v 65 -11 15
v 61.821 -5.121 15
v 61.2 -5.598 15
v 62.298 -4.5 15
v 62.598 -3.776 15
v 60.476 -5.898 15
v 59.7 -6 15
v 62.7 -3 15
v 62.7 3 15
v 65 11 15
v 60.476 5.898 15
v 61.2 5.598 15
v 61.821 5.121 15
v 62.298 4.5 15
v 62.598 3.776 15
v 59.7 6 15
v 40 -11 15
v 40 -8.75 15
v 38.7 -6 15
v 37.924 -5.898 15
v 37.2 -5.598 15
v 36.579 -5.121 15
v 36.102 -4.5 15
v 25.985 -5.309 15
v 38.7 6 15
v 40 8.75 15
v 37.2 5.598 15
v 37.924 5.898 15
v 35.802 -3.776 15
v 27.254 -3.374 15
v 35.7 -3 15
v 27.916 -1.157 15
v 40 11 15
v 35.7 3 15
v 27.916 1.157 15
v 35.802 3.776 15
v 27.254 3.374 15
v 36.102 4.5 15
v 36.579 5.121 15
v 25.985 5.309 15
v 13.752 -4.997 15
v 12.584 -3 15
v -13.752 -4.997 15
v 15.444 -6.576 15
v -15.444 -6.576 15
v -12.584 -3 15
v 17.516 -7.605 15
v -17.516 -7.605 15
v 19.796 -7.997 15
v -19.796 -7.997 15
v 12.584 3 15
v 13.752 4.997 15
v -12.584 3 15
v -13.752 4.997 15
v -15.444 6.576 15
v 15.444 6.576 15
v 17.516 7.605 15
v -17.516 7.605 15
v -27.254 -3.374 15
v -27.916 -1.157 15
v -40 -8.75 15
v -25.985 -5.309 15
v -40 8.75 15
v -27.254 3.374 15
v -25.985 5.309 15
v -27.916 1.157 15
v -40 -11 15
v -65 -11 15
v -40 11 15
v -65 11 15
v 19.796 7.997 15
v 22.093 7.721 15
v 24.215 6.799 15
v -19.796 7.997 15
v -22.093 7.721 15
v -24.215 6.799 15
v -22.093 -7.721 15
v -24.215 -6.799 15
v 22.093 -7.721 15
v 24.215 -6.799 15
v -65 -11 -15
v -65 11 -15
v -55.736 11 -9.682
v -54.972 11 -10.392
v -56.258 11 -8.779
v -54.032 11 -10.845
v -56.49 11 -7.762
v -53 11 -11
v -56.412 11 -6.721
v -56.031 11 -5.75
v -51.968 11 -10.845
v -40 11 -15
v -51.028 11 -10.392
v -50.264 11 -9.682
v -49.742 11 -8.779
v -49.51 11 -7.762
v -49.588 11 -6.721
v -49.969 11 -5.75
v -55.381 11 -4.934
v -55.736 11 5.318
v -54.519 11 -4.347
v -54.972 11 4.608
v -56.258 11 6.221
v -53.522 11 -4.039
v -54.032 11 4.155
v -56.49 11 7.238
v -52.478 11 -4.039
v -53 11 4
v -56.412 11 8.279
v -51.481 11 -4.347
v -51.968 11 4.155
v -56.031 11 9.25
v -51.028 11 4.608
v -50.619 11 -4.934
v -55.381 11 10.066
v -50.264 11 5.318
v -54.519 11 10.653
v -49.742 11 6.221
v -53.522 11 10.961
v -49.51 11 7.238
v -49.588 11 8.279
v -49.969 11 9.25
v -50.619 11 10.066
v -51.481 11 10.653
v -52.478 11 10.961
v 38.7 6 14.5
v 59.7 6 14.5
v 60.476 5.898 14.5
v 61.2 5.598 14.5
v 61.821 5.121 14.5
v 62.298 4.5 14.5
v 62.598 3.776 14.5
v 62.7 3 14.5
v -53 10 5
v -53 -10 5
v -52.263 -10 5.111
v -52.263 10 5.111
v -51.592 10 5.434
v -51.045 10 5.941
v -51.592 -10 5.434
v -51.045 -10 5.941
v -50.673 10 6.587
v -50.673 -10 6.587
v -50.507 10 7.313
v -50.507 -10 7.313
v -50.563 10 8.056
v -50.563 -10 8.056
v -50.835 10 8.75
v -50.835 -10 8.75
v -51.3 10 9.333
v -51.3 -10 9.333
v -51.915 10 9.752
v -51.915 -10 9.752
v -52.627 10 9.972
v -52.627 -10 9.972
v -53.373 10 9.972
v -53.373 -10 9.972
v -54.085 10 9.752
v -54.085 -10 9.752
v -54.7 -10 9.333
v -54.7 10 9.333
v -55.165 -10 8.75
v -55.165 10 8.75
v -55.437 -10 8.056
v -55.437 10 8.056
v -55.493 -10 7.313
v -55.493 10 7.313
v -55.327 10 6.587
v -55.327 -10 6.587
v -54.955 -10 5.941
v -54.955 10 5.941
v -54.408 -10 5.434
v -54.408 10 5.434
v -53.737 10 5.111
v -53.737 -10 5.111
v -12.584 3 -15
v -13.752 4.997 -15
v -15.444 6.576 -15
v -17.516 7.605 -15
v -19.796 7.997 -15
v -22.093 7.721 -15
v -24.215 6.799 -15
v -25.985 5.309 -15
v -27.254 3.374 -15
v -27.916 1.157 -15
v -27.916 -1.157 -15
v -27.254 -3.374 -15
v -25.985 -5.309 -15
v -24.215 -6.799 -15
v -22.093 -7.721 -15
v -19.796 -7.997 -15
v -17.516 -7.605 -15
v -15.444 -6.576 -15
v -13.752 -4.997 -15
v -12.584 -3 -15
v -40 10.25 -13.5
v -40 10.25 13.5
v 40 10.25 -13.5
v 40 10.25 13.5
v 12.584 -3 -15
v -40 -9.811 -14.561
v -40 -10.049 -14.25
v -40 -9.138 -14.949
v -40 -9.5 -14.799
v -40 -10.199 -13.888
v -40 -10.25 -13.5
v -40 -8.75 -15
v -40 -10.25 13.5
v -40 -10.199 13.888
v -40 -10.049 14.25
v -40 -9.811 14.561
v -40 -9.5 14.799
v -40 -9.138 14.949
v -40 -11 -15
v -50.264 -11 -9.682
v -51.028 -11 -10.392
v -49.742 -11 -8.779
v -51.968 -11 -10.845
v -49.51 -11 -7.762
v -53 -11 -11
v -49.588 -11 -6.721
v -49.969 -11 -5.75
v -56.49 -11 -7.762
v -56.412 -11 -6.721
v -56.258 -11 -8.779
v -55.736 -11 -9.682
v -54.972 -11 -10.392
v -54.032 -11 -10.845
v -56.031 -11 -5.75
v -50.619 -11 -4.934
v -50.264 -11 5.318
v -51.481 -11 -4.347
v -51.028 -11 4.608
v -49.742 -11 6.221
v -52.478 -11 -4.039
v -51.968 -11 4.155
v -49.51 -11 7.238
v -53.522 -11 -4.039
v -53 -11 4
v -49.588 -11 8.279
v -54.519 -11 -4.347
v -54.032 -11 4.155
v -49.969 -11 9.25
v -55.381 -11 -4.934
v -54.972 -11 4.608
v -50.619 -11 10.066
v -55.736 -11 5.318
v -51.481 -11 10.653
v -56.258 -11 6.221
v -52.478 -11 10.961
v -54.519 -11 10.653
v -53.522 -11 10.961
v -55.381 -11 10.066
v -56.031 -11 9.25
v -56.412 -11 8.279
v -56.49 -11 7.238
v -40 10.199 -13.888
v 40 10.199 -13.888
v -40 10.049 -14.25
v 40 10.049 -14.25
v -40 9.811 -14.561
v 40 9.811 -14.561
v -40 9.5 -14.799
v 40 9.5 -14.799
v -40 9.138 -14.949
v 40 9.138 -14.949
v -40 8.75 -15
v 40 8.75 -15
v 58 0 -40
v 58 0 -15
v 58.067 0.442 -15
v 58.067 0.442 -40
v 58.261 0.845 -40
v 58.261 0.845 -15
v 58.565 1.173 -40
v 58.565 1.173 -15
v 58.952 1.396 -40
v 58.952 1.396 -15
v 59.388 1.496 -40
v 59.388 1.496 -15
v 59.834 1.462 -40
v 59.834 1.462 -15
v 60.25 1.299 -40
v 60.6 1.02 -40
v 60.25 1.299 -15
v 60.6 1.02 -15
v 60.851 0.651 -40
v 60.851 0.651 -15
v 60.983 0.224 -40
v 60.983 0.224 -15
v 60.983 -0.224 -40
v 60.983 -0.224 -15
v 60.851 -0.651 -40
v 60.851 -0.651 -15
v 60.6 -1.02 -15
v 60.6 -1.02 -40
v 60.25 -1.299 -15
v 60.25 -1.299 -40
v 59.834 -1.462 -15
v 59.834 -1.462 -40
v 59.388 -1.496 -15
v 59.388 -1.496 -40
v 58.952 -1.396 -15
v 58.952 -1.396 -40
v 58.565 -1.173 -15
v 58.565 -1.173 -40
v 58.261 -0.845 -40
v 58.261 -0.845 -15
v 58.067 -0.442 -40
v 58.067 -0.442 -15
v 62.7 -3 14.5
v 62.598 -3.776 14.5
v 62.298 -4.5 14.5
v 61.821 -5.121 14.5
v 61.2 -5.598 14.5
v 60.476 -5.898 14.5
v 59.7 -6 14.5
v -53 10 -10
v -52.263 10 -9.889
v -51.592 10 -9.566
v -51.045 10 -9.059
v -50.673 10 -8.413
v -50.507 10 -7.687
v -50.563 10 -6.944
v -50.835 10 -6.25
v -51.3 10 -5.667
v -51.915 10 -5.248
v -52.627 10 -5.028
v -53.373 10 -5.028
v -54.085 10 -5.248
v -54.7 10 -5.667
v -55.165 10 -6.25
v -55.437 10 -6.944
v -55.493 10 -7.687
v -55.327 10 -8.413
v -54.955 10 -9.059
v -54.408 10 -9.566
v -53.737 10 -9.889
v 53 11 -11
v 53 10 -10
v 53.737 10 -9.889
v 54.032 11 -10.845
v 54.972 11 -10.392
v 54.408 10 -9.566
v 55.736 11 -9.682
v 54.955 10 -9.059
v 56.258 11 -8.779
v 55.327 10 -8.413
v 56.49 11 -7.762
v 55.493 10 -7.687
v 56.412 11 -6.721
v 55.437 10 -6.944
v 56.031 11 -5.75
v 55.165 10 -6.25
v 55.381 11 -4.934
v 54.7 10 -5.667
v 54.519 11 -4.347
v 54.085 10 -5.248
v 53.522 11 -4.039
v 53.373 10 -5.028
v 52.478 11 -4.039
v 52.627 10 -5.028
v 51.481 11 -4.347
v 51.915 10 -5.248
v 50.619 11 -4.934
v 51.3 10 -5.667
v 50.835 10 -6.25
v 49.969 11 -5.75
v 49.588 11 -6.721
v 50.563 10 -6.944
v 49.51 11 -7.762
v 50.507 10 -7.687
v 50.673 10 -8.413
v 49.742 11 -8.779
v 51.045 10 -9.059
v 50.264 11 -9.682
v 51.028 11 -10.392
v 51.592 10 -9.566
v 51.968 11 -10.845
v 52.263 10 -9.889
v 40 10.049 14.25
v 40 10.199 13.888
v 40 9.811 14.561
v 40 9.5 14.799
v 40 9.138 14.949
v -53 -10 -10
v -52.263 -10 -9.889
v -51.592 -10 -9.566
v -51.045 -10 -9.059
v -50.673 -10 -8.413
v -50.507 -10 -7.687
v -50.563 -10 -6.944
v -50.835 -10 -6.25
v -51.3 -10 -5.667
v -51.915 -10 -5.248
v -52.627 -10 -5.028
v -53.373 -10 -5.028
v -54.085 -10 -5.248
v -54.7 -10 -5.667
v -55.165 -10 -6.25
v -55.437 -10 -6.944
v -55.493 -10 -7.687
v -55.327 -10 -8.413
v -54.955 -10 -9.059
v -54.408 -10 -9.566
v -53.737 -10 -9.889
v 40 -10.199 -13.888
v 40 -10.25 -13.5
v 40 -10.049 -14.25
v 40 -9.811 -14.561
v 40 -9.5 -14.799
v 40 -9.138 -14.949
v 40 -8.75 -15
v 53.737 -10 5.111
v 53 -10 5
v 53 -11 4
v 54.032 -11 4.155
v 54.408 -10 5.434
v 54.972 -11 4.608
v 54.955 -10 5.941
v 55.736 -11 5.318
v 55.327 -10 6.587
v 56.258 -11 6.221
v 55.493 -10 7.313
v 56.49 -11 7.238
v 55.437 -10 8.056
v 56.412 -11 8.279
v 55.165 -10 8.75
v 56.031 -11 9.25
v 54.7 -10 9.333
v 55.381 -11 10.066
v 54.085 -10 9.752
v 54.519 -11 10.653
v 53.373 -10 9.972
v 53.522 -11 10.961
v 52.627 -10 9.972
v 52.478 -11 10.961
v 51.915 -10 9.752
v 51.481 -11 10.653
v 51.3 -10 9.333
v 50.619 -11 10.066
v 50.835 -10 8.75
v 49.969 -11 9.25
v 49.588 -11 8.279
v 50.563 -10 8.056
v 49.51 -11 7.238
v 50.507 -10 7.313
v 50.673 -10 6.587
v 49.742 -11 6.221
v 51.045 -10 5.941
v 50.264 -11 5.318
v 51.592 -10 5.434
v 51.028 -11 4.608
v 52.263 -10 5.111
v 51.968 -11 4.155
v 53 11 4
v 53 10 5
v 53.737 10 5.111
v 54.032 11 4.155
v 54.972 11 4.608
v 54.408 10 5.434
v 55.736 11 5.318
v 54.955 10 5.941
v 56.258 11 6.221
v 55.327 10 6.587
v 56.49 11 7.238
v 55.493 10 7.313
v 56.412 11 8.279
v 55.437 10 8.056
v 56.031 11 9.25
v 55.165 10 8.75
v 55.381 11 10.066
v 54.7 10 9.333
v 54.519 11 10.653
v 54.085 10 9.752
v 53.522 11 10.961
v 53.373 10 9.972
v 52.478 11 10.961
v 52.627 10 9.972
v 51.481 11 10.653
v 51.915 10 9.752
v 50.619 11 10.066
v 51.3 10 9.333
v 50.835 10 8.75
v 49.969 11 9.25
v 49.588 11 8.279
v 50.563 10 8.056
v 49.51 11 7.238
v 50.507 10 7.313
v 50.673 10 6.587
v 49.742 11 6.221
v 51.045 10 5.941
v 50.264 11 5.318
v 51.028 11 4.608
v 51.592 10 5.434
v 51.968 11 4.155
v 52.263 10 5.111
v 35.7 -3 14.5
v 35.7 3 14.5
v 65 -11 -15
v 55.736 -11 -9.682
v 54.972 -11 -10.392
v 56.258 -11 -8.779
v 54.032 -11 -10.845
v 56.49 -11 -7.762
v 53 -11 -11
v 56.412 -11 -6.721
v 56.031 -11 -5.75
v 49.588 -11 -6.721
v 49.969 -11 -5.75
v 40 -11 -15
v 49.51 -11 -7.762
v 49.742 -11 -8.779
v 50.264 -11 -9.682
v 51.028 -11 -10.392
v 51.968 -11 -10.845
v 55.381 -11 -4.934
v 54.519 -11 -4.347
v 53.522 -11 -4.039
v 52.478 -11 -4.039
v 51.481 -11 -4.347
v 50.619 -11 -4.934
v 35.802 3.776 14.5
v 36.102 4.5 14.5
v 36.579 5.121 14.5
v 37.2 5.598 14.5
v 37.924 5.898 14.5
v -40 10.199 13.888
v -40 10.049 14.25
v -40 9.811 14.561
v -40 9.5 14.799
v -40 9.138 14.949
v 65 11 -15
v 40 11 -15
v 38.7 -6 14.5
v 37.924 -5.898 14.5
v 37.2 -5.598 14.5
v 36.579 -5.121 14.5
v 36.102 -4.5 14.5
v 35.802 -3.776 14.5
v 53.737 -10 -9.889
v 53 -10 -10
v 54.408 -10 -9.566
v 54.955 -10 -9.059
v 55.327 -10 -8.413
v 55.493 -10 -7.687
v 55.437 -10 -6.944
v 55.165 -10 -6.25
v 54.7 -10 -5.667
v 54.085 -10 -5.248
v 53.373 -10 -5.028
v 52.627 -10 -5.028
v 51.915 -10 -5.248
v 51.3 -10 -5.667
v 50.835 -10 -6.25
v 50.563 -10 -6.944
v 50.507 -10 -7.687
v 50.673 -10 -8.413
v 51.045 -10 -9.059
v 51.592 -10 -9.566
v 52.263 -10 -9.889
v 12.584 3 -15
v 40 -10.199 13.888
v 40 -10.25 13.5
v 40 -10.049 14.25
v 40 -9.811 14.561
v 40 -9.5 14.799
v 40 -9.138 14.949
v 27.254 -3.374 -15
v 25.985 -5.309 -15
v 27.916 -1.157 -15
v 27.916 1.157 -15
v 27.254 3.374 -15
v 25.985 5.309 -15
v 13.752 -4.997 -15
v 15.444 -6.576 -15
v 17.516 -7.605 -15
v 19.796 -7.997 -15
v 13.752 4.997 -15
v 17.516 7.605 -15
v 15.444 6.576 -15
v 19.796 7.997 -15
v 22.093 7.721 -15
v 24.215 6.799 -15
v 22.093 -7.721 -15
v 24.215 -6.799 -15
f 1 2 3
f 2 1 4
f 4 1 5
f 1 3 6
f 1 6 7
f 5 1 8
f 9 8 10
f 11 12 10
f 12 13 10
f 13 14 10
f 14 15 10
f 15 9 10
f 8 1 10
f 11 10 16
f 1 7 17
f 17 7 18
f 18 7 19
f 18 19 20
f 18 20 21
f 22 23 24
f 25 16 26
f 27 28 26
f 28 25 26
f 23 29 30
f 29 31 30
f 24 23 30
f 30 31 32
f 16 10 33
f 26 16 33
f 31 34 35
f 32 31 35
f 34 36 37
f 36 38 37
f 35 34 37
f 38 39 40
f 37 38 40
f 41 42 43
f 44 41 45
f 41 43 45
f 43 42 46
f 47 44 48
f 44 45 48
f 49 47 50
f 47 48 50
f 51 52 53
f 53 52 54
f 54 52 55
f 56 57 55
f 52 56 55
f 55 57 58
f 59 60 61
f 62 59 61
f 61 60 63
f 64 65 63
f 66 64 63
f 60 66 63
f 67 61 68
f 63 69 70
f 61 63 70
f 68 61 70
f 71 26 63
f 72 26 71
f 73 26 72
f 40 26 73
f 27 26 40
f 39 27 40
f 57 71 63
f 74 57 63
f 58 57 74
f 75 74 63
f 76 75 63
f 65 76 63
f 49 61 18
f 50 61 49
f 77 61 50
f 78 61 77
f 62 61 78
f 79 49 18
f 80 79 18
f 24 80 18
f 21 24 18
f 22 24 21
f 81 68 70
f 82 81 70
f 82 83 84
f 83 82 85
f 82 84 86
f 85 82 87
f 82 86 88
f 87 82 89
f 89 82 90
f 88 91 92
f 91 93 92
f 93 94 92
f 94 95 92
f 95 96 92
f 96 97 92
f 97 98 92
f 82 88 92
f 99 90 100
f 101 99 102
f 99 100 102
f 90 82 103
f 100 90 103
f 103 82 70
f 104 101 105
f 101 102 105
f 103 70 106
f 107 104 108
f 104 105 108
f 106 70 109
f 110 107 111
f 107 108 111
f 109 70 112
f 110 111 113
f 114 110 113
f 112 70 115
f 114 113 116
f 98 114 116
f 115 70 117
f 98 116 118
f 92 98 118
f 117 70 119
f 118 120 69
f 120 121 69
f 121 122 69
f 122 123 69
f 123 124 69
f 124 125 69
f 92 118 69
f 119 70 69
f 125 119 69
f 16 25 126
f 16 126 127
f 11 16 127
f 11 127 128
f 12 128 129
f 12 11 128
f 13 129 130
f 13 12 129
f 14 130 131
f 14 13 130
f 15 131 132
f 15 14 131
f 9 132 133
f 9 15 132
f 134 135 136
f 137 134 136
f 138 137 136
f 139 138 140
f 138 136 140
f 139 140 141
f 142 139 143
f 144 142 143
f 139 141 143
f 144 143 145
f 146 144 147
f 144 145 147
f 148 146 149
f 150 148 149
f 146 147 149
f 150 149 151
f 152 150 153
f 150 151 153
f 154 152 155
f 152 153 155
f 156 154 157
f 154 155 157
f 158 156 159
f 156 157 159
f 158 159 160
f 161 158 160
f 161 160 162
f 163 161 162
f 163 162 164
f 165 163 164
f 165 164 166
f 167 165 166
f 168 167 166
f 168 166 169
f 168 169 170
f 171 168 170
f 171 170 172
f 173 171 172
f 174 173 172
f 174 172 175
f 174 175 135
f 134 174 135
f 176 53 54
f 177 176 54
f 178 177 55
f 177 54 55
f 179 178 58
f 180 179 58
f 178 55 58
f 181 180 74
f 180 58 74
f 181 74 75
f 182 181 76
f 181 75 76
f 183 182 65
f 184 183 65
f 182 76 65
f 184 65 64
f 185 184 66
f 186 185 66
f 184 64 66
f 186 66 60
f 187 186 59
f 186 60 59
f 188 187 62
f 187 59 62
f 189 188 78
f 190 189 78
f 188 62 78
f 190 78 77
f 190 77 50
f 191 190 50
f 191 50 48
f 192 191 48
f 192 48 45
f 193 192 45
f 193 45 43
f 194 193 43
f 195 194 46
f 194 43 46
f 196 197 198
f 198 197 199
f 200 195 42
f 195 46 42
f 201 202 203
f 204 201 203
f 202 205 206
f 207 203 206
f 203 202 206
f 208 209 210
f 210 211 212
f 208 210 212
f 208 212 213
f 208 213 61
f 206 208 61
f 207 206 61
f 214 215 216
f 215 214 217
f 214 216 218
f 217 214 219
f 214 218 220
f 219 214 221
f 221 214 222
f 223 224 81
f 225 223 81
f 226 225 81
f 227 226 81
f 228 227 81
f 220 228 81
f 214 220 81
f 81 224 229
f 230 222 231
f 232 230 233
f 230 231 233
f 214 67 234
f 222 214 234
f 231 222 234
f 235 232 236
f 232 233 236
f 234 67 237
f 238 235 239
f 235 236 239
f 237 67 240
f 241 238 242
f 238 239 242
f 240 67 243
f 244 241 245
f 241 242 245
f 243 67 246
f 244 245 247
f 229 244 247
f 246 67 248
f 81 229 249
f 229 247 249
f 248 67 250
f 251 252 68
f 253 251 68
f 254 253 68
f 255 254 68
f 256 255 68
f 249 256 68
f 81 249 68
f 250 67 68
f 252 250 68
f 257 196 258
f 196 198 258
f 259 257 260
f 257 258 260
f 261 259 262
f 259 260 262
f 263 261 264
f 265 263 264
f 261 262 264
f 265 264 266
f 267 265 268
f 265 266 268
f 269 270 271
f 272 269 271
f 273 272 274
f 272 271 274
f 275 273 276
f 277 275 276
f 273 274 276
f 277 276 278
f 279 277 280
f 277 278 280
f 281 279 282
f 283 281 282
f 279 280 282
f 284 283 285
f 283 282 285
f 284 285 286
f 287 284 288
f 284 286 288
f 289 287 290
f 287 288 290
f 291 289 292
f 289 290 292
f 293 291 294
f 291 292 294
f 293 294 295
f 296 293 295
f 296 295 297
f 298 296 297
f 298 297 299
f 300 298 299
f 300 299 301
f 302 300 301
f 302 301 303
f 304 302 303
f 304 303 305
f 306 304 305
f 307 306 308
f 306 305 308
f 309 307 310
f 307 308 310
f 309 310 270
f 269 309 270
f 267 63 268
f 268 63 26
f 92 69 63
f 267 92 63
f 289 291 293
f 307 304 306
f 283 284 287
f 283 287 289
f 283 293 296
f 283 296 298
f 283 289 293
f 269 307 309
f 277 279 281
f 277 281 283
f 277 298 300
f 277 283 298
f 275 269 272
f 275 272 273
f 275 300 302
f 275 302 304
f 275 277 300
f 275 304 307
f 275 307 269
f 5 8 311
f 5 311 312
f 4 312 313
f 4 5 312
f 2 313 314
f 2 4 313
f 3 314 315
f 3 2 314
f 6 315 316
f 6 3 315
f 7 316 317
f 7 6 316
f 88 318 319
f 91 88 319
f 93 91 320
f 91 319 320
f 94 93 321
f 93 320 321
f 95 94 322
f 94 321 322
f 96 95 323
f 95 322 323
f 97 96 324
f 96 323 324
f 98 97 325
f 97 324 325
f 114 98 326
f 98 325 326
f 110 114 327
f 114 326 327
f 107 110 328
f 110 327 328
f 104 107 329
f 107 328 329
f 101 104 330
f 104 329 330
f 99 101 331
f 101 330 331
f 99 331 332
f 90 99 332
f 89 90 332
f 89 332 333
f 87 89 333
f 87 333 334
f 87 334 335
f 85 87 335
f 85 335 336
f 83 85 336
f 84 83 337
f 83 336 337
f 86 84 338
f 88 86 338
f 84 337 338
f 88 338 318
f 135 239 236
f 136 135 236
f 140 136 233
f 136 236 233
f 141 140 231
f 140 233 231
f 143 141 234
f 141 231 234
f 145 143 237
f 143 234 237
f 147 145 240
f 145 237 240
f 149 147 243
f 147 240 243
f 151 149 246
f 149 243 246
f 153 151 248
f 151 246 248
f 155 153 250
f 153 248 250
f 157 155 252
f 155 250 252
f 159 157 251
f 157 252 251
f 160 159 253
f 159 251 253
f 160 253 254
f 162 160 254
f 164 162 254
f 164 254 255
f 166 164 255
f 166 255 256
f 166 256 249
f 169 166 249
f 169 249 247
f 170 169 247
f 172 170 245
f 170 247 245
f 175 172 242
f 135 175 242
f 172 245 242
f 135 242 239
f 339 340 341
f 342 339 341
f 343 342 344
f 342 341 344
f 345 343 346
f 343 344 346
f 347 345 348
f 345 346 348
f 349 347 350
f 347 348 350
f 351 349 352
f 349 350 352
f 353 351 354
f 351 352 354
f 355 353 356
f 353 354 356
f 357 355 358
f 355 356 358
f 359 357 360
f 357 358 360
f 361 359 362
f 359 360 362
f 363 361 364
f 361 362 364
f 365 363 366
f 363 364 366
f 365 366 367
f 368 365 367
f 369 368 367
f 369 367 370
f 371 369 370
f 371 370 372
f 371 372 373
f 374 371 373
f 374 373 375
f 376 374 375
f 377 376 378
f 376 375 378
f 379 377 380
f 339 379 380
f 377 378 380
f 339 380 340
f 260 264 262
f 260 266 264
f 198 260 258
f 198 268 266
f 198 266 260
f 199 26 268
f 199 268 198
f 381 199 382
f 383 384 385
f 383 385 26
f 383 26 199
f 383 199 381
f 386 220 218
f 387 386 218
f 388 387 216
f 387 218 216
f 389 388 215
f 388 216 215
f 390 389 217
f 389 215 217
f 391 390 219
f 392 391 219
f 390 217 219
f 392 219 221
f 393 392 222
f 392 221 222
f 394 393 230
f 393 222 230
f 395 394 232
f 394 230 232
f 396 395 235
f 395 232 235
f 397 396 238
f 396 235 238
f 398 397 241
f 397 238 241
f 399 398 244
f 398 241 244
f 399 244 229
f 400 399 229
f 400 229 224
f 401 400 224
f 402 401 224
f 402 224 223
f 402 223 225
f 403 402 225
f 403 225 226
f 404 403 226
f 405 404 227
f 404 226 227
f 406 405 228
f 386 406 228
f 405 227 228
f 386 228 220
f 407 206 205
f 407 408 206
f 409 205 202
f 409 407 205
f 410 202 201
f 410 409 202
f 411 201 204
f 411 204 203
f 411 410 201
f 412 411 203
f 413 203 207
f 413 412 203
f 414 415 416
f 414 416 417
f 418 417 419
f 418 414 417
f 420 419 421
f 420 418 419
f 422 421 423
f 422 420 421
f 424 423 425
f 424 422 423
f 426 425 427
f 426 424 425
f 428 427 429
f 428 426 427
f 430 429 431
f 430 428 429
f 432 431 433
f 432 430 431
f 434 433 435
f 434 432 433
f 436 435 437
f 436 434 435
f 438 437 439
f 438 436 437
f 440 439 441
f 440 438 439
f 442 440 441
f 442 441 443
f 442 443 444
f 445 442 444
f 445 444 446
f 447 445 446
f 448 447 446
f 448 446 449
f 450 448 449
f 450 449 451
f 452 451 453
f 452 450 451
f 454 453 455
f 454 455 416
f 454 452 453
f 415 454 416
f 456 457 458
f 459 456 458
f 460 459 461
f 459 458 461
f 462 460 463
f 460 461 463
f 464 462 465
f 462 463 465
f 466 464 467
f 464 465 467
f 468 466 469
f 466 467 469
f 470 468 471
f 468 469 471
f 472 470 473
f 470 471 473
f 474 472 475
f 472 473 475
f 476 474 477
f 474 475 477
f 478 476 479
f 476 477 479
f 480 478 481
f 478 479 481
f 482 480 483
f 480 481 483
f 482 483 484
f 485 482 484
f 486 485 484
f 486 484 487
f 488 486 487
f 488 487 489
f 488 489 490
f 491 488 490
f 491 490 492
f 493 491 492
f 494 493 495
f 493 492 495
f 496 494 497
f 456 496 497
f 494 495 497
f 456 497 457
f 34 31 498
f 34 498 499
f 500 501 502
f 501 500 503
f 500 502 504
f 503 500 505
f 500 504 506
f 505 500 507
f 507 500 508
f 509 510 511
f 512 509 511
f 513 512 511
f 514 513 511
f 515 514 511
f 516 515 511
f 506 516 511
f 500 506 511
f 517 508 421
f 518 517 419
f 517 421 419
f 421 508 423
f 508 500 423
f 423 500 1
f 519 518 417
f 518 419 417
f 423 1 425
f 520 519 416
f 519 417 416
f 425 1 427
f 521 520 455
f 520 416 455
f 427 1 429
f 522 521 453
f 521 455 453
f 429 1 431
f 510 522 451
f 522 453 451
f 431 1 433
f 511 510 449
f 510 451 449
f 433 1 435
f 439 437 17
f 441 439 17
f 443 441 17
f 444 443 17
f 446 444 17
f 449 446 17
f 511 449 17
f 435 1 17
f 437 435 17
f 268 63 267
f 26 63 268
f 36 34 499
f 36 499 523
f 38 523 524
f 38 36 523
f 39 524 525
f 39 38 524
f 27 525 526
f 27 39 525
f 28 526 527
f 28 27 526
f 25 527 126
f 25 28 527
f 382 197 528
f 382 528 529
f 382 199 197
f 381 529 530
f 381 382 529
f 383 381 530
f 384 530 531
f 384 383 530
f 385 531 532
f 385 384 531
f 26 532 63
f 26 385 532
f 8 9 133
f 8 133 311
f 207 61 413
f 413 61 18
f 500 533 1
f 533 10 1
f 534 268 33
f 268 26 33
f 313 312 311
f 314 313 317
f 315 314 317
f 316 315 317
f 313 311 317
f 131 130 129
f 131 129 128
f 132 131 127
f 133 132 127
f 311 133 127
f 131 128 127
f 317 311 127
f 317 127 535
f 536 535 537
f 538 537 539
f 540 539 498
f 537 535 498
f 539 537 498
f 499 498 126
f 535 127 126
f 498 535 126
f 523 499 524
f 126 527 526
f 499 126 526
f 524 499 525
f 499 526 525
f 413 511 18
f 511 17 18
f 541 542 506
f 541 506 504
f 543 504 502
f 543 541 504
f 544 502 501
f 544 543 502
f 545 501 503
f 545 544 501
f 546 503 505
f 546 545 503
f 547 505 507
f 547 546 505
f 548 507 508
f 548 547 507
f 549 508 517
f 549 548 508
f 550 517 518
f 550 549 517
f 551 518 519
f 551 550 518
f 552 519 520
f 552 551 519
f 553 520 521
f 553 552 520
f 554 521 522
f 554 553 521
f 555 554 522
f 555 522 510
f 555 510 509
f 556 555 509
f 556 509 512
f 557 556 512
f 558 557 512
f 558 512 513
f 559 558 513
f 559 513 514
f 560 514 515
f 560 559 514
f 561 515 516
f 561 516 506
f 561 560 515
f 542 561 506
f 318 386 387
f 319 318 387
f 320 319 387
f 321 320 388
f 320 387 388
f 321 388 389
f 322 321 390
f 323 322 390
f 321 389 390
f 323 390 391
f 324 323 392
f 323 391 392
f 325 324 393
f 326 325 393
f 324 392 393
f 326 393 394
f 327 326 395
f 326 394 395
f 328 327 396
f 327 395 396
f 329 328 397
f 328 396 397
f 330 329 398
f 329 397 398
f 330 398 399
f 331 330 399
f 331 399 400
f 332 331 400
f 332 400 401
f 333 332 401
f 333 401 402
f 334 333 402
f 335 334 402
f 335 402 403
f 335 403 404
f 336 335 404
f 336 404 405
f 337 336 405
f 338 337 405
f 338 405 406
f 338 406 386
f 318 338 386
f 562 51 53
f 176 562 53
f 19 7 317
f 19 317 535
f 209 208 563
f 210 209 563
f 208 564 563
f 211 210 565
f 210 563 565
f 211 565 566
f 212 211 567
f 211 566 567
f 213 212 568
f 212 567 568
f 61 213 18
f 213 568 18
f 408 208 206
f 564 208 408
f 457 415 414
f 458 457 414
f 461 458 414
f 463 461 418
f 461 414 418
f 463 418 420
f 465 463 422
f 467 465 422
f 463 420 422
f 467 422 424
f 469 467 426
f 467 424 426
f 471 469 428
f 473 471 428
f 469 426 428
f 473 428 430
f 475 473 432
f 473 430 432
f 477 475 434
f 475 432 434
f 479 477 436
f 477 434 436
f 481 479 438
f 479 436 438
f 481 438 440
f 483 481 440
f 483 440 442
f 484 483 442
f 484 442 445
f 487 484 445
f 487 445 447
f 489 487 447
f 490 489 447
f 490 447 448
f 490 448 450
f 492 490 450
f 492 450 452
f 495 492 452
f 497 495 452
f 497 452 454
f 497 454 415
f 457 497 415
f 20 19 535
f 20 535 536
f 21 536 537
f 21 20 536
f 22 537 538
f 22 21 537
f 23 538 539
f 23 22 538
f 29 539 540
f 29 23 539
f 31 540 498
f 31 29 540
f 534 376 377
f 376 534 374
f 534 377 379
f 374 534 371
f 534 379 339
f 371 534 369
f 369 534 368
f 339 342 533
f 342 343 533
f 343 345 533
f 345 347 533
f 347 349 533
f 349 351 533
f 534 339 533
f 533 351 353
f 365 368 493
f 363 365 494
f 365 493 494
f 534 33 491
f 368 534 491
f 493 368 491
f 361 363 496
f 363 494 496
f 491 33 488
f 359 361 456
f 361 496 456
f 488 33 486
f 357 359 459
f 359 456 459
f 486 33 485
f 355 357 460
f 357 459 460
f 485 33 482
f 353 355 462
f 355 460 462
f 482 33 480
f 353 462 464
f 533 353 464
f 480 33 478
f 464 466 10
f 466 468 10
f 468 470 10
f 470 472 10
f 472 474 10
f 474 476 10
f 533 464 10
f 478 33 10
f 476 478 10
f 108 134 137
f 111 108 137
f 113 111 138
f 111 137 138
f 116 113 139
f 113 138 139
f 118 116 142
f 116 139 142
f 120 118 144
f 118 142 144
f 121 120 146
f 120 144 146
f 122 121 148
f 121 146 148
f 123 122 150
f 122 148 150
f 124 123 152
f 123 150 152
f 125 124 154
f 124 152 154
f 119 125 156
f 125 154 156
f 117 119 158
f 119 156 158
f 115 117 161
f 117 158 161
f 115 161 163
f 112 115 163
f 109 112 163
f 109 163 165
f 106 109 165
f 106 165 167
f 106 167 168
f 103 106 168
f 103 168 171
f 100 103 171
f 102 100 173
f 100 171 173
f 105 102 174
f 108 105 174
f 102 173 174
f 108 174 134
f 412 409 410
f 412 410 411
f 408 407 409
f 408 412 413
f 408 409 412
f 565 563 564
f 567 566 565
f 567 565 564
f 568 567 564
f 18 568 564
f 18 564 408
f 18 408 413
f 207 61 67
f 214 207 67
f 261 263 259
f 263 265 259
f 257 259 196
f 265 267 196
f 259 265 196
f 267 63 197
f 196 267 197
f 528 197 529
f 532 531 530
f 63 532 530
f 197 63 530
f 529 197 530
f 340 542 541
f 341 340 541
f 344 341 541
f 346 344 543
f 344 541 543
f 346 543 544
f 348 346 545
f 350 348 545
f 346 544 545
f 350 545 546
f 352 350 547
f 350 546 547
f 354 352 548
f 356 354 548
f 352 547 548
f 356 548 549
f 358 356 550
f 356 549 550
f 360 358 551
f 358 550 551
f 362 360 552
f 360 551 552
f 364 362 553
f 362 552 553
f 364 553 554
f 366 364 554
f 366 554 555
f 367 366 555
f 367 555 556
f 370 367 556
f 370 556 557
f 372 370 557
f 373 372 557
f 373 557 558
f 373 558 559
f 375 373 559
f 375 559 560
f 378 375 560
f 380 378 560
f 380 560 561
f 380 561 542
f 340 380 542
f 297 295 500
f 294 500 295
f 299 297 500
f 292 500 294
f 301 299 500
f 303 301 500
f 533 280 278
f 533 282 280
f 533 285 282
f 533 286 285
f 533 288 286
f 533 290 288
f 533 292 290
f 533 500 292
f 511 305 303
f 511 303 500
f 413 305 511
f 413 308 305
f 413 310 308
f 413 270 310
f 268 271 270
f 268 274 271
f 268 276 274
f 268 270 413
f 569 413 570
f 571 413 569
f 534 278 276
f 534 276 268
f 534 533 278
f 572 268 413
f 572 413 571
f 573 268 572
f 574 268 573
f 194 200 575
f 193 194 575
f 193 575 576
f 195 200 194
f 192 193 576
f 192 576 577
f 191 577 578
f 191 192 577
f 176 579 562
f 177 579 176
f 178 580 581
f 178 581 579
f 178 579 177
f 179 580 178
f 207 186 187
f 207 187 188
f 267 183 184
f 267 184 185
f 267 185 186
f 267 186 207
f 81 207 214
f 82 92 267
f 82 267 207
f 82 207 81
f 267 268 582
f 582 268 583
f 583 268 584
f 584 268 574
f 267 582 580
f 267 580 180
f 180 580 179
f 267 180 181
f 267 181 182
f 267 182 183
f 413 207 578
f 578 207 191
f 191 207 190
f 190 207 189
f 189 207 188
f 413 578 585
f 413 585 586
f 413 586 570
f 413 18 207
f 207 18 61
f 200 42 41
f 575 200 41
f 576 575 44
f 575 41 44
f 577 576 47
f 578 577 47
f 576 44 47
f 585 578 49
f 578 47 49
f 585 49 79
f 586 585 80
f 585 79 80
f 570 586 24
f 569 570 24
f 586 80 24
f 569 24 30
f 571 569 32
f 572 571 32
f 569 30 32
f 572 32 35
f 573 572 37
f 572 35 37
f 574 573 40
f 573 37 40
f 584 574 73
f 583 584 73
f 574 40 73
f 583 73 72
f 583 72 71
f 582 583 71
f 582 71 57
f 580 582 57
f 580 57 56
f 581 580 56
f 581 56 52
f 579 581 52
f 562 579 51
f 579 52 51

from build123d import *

# Parameters (mm, degrees)
EXTRUDE_1_DEPTH     = 15
HOLE_WIZARD_M6_1_D  = 5
CHAMFER_1_SIZE      = 1
SKETCH_4_W          = 80
SKETCH_4_H          = 1.5
EXTRUDE_2_DEPTH     = 30
EXTRUDE_2_2_DEPTH   = 30
FILLET_1_R          = 1.5
FILLET_2_R          = 1.5
CUT_EXTRUDE_1_DEPTH = 0.5
SKETCH_6_R          = 1.5
EXTRUDE_3_DEPTH     = 25


with BuildPart() as part:
    # 草图1 → 凸台-拉伸1 (new, symmetric)
    with BuildSketch(Plane.XY):
        Polygon((-40, 11), (-40, 8.75), (40, 8.75), (40, 11), (65, 11), (65, -11), (40, -11), (40, -8.75), (-40, -8.75), (-40, -11), (-65, -11), (-65, 11), align=None)
        with BuildLine():
            Line((-12.583801513, -3), (12.583801513, -3))
            ThreePointArc((12.583801513, -3), (28, 0), (12.583801513, 3))
            Line((12.583801513, 3), (-12.583801513, 3))
            ThreePointArc((-12.583801513, 3), (-28, 0), (-12.583801513, -3))
        make_face(mode=Mode.SUBTRACT)
    extrude(amount=EXTRUDE_1_DEPTH, both=True)

    # M6 螺纹孔1 (through all)
    with Locations(Plane(origin=(-53, 11, -7.5), x_dir=(0, 0, 1), z_dir=(0, 1, 0))):
        with Locations((0, 0), (15, 0), (0, 106), (15, 106)):
            Hole(HOLE_WIZARD_M6_1_D / 2)

    # 倒角1
    chamfer_1_edges = [part.edges().sort_by_distance(p)[0] for p in [
        (53, 11, 10),
        (53, -11, 10),
        (53, 11, -5),
        (53, -11, -5),
        (-53, 11, 10),
        (-53, -11, 10),
        (-53, 11, -5),
        (-53, -11, -5),
    ]]
    chamfer(chamfer_1_edges, length=CHAMFER_1_SIZE)

    # 草图5 → 切除-拉伸1 (cut)
    with BuildSketch(Plane.XY.offset(15)):
        with BuildLine():
            Line((38.7, 6), (59.7, 6))
            ThreePointArc((59.7, 6), (61.821320344, 5.121320344), (62.7, 3))
            Line((62.7, 3), (62.7, -3))
            ThreePointArc((62.7, -3), (61.821320344, -5.121320344), (59.7, -6))
            Line((59.7, -6), (38.7, -6))
            ThreePointArc((38.7, -6), (36.578679656, -5.121320344), (35.7, -3))
            Line((35.7, -3), (35.7, 3))
            ThreePointArc((35.7, 3), (36.578679656, 5.121320344), (38.7, 6))
        make_face()
    extrude(amount=-CUT_EXTRUDE_1_DEPTH, mode=Mode.SUBTRACT)

    # 草图6 → 凸台-拉伸3 (add)
    with BuildSketch(Plane(origin=(0, 0, -15), x_dir=(-1, 0, 0), z_dir=(0, 0, -1))):
        with Locations((-59.5, 0)):
            Circle(SKETCH_6_R)
    extrude(amount=EXTRUDE_3_DEPTH)


with BuildPart() as body_2:
    # 草图4 → 凸台-拉伸2 (new body)
    with BuildSketch(Plane.XY.offset(15)):
        with Locations((0, 9.5)):
            Rectangle(SKETCH_4_W, SKETCH_4_H)
    extrude(amount=-EXTRUDE_2_DEPTH)

    # 圆角1
    fillet_1_edges = [body_2.edges().sort_by_distance(p)[0] for p in [
        (0, 10.25, -15),
        (0, 10.25, 15),
    ]]
    fillet(fillet_1_edges, radius=FILLET_1_R - 0.0001)  # a hair under: the kernel refuses the full size


with BuildPart() as body_3:
    # 草图4 → Extrude 2 2 (new body)
    with BuildSketch(Plane.XY.offset(15)):
        with Locations((0, -9.5)):
            Rectangle(SKETCH_4_W, SKETCH_4_H)
    extrude(amount=-EXTRUDE_2_2_DEPTH)

    # 圆角2
    fillet_2_edges = [body_3.edges().sort_by_distance(p)[0] for p in [
        (0, -10.25, -15),
        (0, -10.25, 15),
    ]]
    fillet(fillet_2_edges, radius=FILLET_2_R - 0.0001)  # a hair under: the kernel refuses the full size


solid = Compound([part.part, body_2.part, body_3.part])
